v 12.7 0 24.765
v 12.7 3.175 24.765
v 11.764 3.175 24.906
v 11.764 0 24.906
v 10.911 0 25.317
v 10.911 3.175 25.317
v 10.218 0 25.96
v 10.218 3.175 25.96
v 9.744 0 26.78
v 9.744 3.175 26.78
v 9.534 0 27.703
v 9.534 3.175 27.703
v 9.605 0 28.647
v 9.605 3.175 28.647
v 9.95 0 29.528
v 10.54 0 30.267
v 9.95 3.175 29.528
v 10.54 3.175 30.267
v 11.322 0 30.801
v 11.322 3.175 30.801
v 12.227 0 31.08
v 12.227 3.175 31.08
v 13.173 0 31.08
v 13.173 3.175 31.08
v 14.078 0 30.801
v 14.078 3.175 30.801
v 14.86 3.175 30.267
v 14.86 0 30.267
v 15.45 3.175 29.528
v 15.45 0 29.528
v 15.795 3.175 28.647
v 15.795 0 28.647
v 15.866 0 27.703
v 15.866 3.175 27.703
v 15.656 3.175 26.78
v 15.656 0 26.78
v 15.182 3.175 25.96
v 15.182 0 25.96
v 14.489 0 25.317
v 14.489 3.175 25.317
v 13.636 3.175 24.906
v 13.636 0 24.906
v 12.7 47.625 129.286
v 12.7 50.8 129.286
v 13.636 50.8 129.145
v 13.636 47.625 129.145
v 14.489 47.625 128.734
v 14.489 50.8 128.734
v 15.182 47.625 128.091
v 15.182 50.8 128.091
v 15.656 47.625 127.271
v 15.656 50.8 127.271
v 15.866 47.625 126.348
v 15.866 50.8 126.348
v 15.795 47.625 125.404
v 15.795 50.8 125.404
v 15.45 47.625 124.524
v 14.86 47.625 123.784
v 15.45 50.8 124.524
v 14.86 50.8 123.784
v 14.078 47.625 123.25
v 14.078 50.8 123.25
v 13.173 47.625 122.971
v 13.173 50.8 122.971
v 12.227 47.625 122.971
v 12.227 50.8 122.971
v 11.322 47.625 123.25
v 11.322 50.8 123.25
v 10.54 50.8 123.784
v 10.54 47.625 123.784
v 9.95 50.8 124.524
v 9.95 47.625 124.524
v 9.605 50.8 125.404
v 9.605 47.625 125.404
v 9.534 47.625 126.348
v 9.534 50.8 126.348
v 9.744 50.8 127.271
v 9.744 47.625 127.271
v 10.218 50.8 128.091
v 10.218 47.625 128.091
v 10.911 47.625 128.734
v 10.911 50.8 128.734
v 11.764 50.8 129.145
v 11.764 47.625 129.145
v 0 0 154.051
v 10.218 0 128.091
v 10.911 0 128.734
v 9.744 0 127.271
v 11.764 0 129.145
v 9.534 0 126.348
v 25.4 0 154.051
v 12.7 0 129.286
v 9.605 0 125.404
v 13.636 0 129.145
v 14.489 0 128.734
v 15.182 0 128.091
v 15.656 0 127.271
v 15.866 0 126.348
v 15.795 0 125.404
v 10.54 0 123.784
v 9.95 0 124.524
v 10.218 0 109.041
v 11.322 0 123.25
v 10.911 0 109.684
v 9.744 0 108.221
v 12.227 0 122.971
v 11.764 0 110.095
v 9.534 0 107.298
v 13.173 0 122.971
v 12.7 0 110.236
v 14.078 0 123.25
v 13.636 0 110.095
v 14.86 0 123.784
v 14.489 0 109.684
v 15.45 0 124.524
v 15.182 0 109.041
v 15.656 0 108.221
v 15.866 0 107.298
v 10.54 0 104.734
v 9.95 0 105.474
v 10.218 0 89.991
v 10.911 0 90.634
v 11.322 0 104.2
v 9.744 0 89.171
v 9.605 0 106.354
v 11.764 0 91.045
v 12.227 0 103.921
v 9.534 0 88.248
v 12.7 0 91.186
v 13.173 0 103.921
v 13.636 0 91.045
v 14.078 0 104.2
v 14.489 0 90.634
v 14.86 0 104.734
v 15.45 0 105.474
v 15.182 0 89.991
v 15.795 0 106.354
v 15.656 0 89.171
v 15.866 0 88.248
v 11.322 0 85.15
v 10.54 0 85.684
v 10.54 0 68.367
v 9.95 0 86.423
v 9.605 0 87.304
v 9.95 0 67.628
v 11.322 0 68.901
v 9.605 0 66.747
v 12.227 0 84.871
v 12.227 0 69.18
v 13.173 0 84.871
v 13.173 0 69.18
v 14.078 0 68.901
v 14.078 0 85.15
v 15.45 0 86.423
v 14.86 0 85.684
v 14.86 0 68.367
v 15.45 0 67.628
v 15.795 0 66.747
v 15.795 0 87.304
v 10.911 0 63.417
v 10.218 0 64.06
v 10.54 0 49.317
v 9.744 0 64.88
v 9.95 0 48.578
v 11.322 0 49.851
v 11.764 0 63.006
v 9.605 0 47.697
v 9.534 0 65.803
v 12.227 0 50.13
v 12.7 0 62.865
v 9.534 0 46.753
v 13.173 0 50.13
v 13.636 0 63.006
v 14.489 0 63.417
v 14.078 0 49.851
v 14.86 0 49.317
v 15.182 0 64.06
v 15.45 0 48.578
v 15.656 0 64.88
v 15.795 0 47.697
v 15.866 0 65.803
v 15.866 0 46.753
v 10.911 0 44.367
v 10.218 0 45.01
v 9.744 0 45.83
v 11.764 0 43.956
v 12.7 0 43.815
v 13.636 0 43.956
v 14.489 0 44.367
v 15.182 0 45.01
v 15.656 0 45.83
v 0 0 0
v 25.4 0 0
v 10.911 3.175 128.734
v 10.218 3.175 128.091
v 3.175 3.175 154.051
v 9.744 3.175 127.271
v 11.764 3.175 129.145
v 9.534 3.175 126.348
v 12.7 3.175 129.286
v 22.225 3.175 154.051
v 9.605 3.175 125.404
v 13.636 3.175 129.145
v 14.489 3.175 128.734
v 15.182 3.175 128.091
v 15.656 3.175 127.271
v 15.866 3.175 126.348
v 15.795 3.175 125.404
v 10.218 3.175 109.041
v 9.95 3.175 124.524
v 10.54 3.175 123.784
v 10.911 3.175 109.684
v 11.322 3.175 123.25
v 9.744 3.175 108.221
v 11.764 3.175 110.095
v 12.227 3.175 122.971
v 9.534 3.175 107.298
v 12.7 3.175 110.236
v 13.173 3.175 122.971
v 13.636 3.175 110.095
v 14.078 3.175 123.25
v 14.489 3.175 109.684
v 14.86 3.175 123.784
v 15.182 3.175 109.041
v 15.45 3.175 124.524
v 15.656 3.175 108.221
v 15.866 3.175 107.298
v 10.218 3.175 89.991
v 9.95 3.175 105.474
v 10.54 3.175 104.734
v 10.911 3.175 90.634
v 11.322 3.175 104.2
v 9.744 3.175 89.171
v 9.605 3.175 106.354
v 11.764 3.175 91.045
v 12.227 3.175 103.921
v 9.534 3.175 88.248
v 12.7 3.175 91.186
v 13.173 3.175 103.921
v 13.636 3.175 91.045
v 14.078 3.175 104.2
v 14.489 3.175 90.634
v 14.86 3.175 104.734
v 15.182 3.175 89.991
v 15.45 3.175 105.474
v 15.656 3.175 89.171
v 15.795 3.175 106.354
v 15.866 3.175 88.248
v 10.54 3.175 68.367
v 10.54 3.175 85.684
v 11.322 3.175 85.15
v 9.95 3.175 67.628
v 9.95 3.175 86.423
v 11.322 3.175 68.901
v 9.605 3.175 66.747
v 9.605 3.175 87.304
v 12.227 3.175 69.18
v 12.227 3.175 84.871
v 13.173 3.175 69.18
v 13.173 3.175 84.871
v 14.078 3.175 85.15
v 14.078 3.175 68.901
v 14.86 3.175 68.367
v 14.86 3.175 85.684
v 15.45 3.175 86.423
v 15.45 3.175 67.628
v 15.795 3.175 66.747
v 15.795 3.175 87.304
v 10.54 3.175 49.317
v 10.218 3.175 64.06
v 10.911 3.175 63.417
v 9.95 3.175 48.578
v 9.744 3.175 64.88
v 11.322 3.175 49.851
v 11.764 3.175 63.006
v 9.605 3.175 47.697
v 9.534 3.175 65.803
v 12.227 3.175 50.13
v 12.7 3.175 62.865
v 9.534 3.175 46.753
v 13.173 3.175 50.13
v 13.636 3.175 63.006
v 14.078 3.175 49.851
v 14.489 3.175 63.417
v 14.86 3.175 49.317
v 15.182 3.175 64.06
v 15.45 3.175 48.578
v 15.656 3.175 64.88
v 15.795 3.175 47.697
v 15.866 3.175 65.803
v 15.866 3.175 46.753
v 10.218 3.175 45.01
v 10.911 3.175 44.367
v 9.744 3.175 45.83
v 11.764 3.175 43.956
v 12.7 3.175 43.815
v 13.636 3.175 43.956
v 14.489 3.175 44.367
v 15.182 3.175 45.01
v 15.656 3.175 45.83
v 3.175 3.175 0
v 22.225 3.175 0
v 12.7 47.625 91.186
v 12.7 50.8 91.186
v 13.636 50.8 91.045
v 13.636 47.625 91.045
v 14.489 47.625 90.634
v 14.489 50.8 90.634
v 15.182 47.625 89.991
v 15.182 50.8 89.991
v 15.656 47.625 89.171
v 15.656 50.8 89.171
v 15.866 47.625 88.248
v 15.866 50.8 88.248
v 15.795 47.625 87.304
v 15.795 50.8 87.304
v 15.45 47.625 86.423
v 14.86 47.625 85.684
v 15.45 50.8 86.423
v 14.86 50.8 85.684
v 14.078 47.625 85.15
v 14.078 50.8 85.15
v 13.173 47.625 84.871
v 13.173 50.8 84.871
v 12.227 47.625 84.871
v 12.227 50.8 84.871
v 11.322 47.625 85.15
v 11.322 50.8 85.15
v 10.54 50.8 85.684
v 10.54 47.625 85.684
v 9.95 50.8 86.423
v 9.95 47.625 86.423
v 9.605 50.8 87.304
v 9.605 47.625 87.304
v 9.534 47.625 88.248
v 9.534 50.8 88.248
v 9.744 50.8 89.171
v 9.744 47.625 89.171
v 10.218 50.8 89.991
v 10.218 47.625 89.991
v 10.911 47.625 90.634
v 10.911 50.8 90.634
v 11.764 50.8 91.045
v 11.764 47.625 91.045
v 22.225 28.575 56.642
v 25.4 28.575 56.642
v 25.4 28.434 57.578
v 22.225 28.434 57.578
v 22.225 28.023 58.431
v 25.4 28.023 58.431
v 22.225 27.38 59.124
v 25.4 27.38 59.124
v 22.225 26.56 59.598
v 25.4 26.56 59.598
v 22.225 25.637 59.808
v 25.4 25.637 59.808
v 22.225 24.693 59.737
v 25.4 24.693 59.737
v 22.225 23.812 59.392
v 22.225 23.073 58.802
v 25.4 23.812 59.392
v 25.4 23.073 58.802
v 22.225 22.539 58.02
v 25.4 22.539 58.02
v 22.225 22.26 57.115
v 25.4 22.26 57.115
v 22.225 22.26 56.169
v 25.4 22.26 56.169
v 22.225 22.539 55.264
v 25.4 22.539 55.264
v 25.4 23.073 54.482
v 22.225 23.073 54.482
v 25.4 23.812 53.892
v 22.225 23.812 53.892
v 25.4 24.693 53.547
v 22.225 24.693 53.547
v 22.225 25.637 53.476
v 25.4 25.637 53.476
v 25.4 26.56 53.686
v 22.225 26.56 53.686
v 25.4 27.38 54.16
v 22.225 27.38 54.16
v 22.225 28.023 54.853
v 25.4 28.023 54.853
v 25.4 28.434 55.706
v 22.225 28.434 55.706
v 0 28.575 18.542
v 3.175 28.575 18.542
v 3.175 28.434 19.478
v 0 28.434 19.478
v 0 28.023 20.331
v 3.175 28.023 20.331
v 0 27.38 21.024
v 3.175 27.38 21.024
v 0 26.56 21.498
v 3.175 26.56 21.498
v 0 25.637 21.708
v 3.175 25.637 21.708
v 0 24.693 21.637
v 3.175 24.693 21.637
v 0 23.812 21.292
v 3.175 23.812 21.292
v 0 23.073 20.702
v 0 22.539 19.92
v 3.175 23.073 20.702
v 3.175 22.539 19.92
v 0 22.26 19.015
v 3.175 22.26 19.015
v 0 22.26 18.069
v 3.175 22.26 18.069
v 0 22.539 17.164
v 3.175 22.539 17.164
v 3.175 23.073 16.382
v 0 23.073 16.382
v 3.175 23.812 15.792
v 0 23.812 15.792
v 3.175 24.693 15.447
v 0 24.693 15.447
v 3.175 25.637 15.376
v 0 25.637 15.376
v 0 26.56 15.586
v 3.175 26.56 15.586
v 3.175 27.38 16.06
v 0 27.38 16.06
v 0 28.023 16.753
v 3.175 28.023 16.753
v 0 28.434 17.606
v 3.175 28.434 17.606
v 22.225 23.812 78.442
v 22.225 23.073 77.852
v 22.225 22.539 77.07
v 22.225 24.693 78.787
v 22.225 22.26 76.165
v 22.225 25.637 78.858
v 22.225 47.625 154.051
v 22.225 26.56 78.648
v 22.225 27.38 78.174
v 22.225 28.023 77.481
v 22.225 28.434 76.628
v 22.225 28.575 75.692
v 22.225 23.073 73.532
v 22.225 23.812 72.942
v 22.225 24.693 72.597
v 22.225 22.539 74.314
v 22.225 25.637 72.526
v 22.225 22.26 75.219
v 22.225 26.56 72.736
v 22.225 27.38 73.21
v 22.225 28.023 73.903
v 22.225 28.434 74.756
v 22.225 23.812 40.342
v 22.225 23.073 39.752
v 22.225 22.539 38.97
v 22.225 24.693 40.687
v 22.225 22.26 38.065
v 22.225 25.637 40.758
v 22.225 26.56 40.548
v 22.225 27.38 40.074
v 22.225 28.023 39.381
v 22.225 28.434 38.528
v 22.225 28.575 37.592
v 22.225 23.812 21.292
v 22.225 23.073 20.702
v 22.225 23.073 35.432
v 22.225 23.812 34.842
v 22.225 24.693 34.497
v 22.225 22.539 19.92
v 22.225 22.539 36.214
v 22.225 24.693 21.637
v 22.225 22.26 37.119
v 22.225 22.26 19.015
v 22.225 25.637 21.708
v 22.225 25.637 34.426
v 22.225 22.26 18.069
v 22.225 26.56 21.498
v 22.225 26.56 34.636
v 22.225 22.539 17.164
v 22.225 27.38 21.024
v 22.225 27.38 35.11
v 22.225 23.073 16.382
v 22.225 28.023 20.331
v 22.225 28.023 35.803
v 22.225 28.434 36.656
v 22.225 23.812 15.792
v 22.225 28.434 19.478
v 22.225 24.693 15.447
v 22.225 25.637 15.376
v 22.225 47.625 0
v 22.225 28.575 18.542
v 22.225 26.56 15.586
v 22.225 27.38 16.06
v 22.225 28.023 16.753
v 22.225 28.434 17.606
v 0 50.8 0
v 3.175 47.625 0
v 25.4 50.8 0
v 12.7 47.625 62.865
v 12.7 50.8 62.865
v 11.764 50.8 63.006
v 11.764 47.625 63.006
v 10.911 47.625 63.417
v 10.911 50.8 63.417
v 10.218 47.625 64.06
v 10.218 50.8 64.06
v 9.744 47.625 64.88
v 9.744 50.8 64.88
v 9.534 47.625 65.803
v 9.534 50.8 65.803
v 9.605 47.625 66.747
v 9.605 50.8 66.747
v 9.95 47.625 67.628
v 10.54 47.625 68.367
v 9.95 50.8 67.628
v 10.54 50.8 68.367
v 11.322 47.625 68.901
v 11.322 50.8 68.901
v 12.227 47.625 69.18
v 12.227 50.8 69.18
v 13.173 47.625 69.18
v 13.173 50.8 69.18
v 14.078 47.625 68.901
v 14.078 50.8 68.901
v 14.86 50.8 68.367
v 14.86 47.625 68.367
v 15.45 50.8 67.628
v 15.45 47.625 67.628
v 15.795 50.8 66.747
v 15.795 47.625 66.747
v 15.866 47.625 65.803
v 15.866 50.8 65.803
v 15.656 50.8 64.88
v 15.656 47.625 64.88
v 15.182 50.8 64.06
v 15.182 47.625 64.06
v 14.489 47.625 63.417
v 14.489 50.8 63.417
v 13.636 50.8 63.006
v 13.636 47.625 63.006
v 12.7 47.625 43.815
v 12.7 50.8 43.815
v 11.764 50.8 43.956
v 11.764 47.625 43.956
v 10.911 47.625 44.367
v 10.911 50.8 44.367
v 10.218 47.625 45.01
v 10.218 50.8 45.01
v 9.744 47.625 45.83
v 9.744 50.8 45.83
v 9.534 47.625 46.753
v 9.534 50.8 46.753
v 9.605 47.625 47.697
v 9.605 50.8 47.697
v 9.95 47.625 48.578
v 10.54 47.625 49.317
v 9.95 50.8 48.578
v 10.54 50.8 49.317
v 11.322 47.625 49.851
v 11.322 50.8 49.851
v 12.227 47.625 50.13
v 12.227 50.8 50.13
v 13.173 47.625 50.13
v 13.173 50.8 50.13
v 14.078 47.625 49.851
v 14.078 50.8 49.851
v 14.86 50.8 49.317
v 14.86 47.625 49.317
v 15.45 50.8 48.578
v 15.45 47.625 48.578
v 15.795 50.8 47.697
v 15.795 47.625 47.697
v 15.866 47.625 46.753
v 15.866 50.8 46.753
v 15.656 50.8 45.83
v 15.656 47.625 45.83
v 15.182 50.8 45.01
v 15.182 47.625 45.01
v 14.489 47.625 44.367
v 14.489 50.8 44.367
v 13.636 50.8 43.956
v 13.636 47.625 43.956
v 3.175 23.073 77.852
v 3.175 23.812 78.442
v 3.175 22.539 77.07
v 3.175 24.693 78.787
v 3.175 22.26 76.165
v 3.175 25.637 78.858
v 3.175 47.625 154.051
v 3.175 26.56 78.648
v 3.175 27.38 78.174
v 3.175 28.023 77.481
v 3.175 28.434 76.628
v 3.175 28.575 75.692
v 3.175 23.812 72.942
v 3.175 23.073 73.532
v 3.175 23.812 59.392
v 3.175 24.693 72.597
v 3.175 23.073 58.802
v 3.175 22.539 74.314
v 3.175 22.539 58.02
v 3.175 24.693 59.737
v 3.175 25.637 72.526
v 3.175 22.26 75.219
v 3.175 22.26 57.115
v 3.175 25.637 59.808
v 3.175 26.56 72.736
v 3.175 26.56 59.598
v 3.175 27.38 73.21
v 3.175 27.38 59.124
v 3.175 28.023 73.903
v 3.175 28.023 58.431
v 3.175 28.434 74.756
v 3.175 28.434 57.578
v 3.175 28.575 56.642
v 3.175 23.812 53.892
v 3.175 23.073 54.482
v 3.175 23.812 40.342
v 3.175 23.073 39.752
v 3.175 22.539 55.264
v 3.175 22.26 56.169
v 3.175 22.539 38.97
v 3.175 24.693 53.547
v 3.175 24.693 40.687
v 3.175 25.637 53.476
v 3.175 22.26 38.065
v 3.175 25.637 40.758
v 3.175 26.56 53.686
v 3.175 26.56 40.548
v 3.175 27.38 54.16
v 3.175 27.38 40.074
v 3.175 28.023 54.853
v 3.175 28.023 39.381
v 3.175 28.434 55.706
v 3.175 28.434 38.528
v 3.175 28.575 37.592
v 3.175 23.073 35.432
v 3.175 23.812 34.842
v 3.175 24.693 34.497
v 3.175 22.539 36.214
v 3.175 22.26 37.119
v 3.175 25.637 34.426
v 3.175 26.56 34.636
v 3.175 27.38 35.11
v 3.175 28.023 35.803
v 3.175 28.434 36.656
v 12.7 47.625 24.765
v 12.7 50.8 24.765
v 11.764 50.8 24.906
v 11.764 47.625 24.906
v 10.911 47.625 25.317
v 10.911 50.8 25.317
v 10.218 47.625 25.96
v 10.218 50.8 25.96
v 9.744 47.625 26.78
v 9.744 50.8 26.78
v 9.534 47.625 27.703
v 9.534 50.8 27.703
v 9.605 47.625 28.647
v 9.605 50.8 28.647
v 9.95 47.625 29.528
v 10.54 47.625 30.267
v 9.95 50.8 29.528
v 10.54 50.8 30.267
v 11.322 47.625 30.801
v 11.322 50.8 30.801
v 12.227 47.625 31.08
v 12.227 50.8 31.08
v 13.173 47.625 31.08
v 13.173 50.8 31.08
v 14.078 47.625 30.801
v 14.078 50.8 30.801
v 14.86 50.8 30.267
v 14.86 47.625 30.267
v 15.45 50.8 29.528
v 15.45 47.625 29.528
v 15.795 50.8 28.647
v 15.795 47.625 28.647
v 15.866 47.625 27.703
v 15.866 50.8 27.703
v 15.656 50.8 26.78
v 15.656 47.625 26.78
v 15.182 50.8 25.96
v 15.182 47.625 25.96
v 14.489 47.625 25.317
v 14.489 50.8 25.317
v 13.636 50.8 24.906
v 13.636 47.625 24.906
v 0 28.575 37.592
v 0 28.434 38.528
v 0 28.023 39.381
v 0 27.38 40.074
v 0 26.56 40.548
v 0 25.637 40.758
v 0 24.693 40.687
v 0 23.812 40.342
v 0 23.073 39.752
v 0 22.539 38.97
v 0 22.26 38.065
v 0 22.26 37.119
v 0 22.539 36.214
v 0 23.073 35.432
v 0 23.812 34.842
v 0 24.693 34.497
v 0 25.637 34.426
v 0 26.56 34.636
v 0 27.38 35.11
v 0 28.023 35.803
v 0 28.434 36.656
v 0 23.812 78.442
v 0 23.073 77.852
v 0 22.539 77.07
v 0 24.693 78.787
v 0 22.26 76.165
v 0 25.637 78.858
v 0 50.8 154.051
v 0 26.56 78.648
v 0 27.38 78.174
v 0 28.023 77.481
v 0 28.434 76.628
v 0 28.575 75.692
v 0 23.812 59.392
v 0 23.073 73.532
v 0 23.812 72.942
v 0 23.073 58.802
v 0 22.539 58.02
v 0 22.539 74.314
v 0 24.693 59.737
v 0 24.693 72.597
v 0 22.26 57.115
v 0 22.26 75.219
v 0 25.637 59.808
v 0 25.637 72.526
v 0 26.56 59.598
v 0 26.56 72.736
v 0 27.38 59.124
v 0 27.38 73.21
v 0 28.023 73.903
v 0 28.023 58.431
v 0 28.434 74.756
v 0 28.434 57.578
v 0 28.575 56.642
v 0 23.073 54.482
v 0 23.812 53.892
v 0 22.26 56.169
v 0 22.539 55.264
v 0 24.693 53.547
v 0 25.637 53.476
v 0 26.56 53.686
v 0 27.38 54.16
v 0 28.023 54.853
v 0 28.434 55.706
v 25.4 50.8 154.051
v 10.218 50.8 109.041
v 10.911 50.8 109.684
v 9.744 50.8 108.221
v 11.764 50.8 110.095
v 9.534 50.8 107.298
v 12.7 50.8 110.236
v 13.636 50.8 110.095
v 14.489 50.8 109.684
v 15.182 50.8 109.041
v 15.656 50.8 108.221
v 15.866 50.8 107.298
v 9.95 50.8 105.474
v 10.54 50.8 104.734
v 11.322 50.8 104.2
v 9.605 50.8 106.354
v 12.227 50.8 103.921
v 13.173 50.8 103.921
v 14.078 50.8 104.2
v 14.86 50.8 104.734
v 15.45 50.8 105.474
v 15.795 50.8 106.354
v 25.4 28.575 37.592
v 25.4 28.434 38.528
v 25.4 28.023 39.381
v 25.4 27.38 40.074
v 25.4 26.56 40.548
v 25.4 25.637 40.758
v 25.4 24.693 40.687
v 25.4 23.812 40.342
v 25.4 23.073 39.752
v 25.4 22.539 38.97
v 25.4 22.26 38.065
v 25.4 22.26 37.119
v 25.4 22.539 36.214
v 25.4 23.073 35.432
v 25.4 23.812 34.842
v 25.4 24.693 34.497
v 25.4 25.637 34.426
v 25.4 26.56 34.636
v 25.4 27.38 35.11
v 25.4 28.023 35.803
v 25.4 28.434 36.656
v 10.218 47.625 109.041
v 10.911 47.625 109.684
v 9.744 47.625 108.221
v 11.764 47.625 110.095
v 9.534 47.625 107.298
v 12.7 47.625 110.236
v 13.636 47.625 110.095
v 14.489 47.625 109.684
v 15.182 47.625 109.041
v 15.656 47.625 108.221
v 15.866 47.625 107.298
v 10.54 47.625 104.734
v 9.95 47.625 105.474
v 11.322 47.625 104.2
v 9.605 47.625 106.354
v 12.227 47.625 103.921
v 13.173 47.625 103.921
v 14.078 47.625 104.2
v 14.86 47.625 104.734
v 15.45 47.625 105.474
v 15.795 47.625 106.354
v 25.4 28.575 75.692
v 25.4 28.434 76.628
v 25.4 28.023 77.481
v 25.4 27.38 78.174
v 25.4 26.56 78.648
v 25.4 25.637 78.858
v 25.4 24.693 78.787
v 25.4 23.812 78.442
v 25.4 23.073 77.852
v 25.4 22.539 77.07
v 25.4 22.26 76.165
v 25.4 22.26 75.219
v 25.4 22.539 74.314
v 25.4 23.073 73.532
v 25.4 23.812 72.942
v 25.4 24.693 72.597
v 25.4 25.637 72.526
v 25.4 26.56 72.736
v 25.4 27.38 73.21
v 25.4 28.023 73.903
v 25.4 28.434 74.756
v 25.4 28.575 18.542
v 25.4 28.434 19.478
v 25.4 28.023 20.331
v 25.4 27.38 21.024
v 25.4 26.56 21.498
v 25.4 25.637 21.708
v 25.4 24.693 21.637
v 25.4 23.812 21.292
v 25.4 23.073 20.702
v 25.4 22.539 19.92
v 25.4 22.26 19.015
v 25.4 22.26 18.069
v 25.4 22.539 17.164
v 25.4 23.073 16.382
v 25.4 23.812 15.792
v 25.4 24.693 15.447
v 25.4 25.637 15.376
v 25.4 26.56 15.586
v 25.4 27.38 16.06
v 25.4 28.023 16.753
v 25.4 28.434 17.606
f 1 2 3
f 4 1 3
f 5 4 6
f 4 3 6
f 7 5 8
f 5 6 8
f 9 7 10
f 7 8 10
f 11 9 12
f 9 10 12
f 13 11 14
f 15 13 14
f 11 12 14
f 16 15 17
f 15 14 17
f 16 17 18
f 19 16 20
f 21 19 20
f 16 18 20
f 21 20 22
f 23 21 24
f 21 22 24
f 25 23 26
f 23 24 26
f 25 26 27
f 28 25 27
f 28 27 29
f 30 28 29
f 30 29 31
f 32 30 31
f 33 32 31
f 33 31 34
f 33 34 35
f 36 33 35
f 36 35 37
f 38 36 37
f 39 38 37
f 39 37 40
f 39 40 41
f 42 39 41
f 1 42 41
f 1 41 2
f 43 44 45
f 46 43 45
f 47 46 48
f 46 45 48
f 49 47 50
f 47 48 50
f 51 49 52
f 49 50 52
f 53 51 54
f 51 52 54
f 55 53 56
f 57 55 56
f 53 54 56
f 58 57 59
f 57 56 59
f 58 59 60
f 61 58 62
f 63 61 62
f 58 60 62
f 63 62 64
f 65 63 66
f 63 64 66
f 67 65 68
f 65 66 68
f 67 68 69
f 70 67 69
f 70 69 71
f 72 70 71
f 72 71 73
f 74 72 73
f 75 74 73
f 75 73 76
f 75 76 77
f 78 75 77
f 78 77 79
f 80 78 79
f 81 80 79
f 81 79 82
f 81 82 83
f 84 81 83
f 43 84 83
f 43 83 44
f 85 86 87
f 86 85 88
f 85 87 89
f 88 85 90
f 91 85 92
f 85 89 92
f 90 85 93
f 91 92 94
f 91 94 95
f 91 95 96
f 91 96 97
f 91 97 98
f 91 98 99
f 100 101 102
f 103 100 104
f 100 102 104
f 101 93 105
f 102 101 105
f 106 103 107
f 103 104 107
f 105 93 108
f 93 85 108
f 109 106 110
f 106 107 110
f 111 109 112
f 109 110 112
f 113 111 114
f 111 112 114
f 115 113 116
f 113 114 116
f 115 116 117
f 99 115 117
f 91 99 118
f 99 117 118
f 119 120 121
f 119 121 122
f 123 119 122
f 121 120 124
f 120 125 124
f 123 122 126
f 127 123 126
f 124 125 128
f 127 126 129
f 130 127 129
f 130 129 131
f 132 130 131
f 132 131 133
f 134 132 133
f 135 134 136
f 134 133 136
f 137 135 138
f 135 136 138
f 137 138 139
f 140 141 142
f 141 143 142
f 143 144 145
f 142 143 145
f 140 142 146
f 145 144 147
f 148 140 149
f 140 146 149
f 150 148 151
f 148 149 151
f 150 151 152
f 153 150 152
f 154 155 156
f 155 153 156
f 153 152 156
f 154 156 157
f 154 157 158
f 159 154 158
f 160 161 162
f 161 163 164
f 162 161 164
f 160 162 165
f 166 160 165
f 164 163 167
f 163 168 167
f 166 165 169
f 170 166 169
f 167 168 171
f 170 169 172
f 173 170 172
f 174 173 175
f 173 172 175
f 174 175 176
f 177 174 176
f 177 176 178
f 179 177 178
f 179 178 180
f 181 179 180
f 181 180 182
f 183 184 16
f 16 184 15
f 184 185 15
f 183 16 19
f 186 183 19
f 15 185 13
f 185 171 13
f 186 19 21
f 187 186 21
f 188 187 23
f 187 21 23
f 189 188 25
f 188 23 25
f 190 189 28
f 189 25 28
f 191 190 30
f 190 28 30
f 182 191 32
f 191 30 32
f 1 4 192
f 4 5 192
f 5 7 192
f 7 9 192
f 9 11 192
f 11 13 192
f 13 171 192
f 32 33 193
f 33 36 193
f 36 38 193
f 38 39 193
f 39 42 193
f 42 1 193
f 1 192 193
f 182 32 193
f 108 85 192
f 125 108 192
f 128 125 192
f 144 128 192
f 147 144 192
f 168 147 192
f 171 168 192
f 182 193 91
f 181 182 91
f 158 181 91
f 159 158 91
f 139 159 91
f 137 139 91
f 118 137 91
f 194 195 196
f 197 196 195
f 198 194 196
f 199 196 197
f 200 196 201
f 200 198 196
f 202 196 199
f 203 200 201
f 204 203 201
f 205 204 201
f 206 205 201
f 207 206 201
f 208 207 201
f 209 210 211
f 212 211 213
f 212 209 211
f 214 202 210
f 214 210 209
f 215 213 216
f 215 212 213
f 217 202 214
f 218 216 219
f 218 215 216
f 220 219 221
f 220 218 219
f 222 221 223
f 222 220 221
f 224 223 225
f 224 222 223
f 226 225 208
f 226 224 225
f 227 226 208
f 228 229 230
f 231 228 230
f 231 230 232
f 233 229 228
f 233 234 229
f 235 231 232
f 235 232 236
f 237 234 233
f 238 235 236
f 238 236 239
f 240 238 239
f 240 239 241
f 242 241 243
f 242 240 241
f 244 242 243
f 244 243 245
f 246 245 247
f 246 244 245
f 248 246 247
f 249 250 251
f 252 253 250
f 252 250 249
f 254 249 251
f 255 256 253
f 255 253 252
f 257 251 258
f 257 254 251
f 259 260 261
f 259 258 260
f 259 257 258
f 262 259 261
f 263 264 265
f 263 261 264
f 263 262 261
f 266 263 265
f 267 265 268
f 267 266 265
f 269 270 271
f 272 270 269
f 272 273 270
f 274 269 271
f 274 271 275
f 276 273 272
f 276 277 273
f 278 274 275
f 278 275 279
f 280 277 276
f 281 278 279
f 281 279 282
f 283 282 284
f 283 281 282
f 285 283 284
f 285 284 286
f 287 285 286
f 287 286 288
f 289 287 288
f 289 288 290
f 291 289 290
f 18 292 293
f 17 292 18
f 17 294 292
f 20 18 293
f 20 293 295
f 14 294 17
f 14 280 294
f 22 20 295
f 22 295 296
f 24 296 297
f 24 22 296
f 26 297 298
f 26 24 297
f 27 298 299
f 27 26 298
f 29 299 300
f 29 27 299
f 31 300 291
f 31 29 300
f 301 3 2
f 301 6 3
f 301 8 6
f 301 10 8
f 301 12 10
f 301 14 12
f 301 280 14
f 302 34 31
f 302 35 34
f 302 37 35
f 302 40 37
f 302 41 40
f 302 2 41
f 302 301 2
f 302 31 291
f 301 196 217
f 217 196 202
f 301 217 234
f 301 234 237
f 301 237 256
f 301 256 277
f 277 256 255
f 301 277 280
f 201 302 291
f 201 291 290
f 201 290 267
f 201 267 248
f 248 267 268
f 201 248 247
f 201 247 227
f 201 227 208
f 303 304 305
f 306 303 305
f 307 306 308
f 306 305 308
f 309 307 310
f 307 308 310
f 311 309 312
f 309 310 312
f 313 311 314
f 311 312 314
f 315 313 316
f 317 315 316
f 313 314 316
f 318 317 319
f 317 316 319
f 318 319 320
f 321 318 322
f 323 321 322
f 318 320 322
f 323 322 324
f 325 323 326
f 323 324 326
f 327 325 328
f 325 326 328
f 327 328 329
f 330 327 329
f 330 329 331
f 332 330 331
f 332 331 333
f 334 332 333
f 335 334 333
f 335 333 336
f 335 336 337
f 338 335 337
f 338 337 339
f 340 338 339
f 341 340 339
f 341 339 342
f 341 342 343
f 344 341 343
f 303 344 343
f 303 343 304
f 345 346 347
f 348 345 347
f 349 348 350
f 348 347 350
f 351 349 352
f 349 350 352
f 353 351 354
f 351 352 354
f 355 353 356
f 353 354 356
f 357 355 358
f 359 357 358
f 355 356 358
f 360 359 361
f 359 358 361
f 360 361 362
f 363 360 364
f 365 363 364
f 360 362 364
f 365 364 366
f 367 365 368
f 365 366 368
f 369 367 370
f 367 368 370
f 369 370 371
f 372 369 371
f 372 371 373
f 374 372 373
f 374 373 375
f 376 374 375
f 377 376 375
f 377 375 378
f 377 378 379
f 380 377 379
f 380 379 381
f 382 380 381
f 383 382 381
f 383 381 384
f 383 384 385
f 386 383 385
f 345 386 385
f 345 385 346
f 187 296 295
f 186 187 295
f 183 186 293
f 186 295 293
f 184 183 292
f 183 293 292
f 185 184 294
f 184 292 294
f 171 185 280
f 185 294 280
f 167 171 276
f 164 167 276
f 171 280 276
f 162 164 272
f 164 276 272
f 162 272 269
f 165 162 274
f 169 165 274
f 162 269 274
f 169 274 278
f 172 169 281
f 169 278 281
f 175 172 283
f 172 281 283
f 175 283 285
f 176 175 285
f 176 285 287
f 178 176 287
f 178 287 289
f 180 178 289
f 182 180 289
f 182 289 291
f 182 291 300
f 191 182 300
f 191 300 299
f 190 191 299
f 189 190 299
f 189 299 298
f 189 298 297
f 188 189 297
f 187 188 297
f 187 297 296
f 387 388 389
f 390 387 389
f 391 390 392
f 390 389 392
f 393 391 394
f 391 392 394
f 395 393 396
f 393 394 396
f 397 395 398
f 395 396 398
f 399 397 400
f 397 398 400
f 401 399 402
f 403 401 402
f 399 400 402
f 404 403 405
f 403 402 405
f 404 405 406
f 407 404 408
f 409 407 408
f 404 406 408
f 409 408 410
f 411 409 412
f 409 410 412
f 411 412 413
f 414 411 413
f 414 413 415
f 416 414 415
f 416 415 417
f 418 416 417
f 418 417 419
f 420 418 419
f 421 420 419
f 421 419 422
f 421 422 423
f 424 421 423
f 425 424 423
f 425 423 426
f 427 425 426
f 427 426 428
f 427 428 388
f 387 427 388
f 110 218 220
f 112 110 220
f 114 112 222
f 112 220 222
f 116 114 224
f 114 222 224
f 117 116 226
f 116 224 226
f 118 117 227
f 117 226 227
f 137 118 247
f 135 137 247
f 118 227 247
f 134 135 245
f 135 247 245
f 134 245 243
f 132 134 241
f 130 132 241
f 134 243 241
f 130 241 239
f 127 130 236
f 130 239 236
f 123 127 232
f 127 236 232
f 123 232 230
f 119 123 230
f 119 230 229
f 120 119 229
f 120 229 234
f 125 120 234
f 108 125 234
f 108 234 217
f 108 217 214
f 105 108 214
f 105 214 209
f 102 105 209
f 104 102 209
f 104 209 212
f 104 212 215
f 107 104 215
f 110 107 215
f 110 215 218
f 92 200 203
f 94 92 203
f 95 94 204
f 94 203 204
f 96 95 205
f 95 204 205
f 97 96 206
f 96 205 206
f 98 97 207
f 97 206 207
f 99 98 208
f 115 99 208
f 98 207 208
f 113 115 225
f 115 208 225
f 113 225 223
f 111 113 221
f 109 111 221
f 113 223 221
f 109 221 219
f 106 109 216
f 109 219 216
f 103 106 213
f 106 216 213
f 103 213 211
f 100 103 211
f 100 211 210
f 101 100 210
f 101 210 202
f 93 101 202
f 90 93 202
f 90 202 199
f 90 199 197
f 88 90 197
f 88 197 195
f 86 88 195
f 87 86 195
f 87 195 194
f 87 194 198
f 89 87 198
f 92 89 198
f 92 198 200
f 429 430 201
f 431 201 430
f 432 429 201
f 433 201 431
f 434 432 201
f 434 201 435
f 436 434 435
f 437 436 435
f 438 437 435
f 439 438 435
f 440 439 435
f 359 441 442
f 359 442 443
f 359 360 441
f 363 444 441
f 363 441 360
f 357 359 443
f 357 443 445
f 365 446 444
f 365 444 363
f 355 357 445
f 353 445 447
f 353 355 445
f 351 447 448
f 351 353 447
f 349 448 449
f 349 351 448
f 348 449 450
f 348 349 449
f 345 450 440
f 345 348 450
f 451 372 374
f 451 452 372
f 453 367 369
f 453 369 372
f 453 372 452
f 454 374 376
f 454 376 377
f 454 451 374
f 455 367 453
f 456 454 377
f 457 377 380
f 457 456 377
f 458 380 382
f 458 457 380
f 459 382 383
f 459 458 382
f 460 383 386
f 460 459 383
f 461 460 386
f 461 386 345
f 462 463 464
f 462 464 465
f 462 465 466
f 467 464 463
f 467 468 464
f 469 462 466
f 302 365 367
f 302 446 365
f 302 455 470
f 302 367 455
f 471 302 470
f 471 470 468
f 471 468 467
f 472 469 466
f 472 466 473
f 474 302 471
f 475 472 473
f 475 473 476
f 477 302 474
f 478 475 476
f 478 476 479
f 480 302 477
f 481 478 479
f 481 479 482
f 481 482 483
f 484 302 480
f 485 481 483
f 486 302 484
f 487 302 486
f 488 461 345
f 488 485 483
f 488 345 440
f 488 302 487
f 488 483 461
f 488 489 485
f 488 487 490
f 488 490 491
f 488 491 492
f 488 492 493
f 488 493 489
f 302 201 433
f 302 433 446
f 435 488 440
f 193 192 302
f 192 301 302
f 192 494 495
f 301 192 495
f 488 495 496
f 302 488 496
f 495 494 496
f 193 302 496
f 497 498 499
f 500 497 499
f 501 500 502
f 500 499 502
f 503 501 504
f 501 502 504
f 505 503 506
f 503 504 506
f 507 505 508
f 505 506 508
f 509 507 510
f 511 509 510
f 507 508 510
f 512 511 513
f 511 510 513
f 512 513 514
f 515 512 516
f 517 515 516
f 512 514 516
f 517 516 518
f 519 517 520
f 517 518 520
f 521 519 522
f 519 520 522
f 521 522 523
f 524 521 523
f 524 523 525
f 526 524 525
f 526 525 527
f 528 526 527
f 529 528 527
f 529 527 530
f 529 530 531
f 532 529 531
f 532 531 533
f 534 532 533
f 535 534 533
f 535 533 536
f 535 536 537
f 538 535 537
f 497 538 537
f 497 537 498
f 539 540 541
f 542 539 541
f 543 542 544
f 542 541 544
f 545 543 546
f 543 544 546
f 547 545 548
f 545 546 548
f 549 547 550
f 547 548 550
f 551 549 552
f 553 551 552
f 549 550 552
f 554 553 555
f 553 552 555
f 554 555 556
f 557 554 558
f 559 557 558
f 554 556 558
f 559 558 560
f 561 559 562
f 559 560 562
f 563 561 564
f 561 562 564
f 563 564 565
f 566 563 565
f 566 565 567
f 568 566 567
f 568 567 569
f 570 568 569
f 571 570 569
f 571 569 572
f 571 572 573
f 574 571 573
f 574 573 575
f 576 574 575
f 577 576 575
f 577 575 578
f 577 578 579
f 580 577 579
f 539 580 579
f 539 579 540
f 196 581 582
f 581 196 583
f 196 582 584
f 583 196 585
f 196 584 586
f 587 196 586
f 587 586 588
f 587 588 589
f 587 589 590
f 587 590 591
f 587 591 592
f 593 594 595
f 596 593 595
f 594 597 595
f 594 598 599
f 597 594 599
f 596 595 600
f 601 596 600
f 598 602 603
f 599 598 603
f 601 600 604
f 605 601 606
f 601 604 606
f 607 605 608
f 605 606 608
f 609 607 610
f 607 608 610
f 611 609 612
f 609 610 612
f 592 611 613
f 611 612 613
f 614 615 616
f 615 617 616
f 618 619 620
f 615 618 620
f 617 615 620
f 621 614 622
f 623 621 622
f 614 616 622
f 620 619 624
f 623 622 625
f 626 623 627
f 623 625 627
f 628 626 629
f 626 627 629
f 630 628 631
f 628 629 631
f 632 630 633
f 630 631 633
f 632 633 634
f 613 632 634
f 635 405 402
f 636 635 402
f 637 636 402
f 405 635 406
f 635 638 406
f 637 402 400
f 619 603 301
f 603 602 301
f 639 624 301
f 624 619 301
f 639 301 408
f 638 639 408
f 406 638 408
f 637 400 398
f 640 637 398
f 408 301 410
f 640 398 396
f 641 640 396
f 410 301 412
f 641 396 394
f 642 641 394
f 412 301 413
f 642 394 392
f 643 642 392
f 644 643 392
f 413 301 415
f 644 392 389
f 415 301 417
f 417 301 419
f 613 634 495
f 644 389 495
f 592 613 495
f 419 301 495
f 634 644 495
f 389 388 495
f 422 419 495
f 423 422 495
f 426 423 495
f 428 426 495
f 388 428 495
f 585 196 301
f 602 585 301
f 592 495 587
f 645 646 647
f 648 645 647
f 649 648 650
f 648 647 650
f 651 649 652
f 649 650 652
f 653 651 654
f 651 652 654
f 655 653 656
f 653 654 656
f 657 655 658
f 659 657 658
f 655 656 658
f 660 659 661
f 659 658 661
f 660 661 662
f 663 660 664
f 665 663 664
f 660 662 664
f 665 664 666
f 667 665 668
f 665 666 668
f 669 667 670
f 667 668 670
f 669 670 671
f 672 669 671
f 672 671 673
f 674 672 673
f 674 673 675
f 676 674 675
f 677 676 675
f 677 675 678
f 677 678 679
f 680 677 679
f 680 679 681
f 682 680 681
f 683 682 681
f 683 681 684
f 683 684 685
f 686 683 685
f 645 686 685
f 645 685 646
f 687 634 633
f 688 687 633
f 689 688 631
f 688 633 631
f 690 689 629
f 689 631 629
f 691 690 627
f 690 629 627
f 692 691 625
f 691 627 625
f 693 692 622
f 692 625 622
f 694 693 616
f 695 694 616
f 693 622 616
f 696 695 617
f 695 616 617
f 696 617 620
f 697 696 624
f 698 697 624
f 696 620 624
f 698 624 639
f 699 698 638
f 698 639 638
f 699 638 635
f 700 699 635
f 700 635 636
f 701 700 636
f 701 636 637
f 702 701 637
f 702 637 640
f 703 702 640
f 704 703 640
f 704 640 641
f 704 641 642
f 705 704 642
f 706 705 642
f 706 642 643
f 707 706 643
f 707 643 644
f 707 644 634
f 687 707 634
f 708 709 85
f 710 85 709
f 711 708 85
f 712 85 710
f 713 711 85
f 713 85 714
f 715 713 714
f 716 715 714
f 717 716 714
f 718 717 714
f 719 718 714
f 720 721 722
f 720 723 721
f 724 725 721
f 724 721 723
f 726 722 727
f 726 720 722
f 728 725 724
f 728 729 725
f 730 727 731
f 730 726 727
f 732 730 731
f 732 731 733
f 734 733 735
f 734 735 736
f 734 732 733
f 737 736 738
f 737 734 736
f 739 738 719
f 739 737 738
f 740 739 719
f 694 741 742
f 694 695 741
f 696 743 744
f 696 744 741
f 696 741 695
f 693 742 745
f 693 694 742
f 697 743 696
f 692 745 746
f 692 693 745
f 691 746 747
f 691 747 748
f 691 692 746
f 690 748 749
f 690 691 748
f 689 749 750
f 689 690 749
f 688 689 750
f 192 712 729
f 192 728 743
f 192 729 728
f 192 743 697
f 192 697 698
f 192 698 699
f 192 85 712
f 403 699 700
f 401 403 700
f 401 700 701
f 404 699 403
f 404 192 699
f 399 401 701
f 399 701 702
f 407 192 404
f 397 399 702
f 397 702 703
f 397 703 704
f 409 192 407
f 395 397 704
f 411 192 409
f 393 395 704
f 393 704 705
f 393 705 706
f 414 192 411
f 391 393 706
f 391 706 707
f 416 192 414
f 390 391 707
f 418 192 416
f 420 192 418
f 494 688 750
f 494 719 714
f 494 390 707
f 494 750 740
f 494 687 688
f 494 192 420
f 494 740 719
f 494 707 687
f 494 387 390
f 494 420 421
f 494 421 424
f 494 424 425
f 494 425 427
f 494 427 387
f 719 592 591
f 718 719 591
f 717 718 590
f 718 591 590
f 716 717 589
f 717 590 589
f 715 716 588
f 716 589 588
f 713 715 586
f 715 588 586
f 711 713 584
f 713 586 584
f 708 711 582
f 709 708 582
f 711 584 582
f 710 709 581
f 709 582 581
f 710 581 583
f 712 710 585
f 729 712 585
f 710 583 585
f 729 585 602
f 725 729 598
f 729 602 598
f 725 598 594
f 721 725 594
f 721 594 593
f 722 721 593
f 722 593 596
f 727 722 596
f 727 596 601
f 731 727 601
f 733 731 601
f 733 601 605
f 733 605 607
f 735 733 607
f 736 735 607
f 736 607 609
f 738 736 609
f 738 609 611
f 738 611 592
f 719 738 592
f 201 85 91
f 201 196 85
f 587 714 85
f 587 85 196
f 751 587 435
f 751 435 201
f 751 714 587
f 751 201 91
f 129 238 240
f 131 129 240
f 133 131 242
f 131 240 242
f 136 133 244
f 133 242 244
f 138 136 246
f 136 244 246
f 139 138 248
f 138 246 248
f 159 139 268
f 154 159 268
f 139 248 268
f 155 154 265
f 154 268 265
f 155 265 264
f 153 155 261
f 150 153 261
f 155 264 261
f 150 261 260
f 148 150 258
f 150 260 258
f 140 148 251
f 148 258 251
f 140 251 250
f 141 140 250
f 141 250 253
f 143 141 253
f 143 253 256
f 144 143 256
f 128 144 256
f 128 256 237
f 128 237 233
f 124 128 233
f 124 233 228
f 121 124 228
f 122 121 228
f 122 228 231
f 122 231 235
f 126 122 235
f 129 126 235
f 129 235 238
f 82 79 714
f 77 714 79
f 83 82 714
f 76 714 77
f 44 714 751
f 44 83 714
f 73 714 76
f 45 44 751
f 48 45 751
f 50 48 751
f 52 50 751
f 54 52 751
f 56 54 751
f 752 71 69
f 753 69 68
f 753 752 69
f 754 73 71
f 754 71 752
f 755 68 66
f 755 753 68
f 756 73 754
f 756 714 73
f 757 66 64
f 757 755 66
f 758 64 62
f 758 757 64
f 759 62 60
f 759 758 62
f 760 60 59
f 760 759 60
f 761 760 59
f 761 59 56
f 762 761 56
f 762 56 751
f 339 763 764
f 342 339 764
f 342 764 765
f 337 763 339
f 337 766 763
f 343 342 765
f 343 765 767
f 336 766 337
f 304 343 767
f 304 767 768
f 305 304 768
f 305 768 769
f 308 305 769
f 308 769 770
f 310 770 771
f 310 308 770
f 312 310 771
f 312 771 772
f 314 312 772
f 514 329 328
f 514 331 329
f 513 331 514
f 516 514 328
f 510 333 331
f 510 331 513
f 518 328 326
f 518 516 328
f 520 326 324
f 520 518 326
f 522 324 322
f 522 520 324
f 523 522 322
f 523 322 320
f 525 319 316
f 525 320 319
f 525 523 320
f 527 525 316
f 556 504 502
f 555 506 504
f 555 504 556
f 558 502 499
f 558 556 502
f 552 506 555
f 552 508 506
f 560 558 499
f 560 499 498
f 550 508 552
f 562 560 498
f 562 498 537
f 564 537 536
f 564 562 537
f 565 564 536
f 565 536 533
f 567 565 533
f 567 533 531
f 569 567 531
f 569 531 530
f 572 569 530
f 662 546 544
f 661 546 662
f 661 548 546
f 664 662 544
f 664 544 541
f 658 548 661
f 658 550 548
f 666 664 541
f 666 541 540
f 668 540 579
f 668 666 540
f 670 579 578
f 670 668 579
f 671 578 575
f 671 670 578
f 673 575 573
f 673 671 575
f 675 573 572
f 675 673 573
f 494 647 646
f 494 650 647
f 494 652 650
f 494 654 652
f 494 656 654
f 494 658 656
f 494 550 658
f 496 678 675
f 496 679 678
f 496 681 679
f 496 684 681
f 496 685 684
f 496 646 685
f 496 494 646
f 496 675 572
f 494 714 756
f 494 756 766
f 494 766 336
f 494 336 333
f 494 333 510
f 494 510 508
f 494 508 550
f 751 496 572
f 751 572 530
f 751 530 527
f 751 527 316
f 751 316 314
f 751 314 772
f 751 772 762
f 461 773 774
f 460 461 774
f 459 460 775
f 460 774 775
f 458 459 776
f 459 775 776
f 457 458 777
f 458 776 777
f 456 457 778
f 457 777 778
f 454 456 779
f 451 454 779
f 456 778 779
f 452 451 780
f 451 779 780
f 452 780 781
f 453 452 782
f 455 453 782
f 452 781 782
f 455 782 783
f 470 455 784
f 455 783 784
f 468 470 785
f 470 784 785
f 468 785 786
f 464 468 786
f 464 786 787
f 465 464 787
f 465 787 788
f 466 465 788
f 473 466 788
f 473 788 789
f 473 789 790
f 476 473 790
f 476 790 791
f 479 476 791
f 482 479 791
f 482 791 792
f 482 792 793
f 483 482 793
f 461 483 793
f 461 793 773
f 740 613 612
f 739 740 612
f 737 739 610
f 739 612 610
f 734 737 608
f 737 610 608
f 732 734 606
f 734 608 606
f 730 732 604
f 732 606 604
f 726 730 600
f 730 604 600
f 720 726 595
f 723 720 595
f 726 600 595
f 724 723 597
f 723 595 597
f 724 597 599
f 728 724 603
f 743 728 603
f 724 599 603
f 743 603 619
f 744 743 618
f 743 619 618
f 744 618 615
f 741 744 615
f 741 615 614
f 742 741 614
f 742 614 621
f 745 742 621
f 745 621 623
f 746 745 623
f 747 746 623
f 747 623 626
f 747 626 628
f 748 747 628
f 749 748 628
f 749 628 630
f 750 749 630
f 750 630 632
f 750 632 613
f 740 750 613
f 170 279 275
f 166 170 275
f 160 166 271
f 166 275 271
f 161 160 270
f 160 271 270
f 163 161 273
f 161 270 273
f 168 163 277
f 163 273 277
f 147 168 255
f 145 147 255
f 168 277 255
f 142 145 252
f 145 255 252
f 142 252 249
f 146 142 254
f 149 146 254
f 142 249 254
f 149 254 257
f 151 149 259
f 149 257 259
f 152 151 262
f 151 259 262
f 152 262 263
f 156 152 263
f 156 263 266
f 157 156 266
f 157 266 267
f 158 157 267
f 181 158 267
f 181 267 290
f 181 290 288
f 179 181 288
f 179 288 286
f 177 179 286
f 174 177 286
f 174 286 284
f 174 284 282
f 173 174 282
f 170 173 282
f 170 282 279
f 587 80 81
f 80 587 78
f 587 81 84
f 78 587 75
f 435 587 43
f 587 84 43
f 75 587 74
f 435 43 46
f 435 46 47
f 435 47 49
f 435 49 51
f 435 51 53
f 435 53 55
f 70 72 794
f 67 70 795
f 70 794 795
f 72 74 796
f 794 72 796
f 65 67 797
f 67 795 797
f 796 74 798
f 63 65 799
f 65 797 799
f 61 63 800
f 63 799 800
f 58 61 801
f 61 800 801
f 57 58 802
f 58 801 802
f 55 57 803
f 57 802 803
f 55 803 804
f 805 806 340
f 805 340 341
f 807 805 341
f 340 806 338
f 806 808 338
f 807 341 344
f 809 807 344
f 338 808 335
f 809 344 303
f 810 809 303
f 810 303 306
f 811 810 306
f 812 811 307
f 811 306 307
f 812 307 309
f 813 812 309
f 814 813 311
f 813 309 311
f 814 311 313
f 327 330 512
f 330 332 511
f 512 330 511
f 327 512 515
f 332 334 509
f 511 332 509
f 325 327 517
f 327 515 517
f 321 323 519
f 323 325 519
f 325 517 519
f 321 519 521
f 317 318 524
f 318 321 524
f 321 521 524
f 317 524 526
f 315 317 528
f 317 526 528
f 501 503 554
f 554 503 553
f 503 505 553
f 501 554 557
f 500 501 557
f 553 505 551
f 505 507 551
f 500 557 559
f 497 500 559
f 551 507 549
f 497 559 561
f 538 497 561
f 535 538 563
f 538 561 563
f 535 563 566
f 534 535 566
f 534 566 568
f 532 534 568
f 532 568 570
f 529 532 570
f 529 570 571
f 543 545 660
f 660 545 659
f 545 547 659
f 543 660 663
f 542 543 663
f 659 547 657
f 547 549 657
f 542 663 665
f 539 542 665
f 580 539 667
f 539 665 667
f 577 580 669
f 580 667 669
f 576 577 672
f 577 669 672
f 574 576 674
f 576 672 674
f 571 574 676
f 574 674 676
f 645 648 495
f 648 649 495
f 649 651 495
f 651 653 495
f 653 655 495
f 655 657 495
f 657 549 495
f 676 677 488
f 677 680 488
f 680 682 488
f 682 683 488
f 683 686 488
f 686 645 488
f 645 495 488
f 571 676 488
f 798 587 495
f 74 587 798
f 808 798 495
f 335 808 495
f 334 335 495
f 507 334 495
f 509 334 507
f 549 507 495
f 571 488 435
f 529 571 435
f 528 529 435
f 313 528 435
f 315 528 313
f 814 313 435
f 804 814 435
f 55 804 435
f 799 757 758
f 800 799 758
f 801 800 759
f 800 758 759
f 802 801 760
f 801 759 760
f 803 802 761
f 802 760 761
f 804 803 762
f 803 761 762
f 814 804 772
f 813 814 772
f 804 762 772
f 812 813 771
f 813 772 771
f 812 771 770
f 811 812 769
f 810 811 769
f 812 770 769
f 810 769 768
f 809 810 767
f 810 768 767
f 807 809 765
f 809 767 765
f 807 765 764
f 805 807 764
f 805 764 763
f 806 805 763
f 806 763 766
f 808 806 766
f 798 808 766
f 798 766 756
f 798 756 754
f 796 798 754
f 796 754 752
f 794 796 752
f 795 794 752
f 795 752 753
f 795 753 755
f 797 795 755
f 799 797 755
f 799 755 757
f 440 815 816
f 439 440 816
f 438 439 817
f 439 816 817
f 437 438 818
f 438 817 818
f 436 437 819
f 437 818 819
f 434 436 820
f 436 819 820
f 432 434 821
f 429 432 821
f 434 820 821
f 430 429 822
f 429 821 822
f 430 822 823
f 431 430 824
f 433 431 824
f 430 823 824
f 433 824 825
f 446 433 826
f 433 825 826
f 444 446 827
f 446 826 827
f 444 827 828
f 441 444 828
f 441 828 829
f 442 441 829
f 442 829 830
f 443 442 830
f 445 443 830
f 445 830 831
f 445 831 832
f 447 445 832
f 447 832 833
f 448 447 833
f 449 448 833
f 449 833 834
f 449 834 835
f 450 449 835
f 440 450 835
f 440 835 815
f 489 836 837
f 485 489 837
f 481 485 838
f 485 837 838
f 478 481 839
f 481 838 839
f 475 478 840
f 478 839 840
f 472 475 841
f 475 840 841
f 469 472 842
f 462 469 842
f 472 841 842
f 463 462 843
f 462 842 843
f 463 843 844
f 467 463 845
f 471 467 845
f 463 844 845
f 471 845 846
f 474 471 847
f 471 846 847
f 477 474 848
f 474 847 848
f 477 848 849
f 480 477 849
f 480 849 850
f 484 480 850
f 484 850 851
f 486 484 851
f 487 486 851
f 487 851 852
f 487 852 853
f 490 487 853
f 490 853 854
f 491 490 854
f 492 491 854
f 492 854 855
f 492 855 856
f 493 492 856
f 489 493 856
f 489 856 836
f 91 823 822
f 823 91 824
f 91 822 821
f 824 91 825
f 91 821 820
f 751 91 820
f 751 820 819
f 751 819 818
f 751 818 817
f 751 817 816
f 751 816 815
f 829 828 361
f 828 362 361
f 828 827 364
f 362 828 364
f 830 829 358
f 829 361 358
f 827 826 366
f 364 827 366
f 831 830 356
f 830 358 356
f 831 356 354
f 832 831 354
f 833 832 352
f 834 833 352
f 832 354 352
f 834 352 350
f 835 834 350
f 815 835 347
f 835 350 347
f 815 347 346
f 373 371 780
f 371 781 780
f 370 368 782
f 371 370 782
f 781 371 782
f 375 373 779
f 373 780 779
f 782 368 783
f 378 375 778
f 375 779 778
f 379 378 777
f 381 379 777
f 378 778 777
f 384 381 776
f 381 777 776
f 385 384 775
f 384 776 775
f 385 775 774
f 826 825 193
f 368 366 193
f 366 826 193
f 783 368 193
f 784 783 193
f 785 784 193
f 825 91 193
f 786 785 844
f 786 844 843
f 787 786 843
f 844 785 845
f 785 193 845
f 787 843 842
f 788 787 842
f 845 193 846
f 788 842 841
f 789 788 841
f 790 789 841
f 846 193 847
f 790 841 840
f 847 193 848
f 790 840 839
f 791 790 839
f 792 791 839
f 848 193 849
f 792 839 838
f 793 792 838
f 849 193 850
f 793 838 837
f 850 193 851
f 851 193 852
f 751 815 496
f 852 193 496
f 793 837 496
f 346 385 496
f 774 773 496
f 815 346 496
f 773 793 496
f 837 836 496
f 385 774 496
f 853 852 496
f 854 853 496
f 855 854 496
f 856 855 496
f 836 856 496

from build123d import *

# Parameters (mm, degrees)
SKETCH1_W           = 25.4
SKETCH1_H           = 50.8
SKETCH1_W_2         = 19.05
SKETCH1_H_2         = 44.45
BOSS_EXTRUDE1_DEPTH = 154.051
SKETCH2_R           = 3.175
CUT_EXTRUDE1_DEPTH  = 165.187425222
SKETCH3_R           = 3.175
CUT_EXTRUDE2_DEPTH  = 165.187425222


with BuildPart() as part:
    # Sketch1 → Boss-Extrude1 (new body)
    with BuildSketch(Plane.XY):
        with Locations((12.7, 25.4)):
            Rectangle(SKETCH1_W, SKETCH1_H)
        with Locations((12.7, 25.4)):
            Rectangle(SKETCH1_W_2, SKETCH1_H_2, mode=Mode.SUBTRACT)
    extrude(amount=BOSS_EXTRUDE1_DEPTH)

    # Sketch2 → Cut-Extrude1 (cut, through all)
    with BuildSketch(Plane(origin=(0, 50.8, 0), x_dir=(1, 0, 0), z_dir=(0, 1, 0))):
        with Locations(Location((12.7, -126.111, 0), (0, 0, 270))):
            Circle(SKETCH2_R)
        with Locations(Location((12.7, -107.061, 0), (0, 0, 270))):
            Circle(SKETCH2_R)
        with Locations(Location((12.7, -88.011, 0), (0, 0, 270))):
            Circle(SKETCH2_R)
        with Locations(Location((12.7, -27.94, 0), (0, 0, 90))):
            Circle(SKETCH2_R)
        with Locations(Location((12.7, -46.99, 0), (0, 0, 90))):
            Circle(SKETCH2_R)
        with Locations(Location((12.7, -66.04, 0), (0, 0, 90))):
            Circle(SKETCH2_R)
    extrude(amount=-CUT_EXTRUDE1_DEPTH, mode=Mode.SUBTRACT)

    # Sketch3 → Cut-Extrude2 (cut, through all)
    with BuildSketch(Plane(origin=(25.4, 0, 0), x_dir=(0, 0, -1), z_dir=(1, 0, 0))):
        with Locations(Location((-18.542, 25.4, 0), (0, 0, 90))):
            Circle(SKETCH3_R)
        with Locations(Location((-37.592, 25.4, 0), (0, 0, 90))):
            Circle(SKETCH3_R)
        with Locations(Location((-56.642, 25.4, 0), (0, 0, 90))):
            Circle(SKETCH3_R)
        with Locations(Location((-75.692, 25.4, 0), (0, 0, 90))):
            Circle(SKETCH3_R)
    extrude(amount=-CUT_EXTRUDE2_DEPTH, mode=Mode.SUBTRACT)


solid = part.part
